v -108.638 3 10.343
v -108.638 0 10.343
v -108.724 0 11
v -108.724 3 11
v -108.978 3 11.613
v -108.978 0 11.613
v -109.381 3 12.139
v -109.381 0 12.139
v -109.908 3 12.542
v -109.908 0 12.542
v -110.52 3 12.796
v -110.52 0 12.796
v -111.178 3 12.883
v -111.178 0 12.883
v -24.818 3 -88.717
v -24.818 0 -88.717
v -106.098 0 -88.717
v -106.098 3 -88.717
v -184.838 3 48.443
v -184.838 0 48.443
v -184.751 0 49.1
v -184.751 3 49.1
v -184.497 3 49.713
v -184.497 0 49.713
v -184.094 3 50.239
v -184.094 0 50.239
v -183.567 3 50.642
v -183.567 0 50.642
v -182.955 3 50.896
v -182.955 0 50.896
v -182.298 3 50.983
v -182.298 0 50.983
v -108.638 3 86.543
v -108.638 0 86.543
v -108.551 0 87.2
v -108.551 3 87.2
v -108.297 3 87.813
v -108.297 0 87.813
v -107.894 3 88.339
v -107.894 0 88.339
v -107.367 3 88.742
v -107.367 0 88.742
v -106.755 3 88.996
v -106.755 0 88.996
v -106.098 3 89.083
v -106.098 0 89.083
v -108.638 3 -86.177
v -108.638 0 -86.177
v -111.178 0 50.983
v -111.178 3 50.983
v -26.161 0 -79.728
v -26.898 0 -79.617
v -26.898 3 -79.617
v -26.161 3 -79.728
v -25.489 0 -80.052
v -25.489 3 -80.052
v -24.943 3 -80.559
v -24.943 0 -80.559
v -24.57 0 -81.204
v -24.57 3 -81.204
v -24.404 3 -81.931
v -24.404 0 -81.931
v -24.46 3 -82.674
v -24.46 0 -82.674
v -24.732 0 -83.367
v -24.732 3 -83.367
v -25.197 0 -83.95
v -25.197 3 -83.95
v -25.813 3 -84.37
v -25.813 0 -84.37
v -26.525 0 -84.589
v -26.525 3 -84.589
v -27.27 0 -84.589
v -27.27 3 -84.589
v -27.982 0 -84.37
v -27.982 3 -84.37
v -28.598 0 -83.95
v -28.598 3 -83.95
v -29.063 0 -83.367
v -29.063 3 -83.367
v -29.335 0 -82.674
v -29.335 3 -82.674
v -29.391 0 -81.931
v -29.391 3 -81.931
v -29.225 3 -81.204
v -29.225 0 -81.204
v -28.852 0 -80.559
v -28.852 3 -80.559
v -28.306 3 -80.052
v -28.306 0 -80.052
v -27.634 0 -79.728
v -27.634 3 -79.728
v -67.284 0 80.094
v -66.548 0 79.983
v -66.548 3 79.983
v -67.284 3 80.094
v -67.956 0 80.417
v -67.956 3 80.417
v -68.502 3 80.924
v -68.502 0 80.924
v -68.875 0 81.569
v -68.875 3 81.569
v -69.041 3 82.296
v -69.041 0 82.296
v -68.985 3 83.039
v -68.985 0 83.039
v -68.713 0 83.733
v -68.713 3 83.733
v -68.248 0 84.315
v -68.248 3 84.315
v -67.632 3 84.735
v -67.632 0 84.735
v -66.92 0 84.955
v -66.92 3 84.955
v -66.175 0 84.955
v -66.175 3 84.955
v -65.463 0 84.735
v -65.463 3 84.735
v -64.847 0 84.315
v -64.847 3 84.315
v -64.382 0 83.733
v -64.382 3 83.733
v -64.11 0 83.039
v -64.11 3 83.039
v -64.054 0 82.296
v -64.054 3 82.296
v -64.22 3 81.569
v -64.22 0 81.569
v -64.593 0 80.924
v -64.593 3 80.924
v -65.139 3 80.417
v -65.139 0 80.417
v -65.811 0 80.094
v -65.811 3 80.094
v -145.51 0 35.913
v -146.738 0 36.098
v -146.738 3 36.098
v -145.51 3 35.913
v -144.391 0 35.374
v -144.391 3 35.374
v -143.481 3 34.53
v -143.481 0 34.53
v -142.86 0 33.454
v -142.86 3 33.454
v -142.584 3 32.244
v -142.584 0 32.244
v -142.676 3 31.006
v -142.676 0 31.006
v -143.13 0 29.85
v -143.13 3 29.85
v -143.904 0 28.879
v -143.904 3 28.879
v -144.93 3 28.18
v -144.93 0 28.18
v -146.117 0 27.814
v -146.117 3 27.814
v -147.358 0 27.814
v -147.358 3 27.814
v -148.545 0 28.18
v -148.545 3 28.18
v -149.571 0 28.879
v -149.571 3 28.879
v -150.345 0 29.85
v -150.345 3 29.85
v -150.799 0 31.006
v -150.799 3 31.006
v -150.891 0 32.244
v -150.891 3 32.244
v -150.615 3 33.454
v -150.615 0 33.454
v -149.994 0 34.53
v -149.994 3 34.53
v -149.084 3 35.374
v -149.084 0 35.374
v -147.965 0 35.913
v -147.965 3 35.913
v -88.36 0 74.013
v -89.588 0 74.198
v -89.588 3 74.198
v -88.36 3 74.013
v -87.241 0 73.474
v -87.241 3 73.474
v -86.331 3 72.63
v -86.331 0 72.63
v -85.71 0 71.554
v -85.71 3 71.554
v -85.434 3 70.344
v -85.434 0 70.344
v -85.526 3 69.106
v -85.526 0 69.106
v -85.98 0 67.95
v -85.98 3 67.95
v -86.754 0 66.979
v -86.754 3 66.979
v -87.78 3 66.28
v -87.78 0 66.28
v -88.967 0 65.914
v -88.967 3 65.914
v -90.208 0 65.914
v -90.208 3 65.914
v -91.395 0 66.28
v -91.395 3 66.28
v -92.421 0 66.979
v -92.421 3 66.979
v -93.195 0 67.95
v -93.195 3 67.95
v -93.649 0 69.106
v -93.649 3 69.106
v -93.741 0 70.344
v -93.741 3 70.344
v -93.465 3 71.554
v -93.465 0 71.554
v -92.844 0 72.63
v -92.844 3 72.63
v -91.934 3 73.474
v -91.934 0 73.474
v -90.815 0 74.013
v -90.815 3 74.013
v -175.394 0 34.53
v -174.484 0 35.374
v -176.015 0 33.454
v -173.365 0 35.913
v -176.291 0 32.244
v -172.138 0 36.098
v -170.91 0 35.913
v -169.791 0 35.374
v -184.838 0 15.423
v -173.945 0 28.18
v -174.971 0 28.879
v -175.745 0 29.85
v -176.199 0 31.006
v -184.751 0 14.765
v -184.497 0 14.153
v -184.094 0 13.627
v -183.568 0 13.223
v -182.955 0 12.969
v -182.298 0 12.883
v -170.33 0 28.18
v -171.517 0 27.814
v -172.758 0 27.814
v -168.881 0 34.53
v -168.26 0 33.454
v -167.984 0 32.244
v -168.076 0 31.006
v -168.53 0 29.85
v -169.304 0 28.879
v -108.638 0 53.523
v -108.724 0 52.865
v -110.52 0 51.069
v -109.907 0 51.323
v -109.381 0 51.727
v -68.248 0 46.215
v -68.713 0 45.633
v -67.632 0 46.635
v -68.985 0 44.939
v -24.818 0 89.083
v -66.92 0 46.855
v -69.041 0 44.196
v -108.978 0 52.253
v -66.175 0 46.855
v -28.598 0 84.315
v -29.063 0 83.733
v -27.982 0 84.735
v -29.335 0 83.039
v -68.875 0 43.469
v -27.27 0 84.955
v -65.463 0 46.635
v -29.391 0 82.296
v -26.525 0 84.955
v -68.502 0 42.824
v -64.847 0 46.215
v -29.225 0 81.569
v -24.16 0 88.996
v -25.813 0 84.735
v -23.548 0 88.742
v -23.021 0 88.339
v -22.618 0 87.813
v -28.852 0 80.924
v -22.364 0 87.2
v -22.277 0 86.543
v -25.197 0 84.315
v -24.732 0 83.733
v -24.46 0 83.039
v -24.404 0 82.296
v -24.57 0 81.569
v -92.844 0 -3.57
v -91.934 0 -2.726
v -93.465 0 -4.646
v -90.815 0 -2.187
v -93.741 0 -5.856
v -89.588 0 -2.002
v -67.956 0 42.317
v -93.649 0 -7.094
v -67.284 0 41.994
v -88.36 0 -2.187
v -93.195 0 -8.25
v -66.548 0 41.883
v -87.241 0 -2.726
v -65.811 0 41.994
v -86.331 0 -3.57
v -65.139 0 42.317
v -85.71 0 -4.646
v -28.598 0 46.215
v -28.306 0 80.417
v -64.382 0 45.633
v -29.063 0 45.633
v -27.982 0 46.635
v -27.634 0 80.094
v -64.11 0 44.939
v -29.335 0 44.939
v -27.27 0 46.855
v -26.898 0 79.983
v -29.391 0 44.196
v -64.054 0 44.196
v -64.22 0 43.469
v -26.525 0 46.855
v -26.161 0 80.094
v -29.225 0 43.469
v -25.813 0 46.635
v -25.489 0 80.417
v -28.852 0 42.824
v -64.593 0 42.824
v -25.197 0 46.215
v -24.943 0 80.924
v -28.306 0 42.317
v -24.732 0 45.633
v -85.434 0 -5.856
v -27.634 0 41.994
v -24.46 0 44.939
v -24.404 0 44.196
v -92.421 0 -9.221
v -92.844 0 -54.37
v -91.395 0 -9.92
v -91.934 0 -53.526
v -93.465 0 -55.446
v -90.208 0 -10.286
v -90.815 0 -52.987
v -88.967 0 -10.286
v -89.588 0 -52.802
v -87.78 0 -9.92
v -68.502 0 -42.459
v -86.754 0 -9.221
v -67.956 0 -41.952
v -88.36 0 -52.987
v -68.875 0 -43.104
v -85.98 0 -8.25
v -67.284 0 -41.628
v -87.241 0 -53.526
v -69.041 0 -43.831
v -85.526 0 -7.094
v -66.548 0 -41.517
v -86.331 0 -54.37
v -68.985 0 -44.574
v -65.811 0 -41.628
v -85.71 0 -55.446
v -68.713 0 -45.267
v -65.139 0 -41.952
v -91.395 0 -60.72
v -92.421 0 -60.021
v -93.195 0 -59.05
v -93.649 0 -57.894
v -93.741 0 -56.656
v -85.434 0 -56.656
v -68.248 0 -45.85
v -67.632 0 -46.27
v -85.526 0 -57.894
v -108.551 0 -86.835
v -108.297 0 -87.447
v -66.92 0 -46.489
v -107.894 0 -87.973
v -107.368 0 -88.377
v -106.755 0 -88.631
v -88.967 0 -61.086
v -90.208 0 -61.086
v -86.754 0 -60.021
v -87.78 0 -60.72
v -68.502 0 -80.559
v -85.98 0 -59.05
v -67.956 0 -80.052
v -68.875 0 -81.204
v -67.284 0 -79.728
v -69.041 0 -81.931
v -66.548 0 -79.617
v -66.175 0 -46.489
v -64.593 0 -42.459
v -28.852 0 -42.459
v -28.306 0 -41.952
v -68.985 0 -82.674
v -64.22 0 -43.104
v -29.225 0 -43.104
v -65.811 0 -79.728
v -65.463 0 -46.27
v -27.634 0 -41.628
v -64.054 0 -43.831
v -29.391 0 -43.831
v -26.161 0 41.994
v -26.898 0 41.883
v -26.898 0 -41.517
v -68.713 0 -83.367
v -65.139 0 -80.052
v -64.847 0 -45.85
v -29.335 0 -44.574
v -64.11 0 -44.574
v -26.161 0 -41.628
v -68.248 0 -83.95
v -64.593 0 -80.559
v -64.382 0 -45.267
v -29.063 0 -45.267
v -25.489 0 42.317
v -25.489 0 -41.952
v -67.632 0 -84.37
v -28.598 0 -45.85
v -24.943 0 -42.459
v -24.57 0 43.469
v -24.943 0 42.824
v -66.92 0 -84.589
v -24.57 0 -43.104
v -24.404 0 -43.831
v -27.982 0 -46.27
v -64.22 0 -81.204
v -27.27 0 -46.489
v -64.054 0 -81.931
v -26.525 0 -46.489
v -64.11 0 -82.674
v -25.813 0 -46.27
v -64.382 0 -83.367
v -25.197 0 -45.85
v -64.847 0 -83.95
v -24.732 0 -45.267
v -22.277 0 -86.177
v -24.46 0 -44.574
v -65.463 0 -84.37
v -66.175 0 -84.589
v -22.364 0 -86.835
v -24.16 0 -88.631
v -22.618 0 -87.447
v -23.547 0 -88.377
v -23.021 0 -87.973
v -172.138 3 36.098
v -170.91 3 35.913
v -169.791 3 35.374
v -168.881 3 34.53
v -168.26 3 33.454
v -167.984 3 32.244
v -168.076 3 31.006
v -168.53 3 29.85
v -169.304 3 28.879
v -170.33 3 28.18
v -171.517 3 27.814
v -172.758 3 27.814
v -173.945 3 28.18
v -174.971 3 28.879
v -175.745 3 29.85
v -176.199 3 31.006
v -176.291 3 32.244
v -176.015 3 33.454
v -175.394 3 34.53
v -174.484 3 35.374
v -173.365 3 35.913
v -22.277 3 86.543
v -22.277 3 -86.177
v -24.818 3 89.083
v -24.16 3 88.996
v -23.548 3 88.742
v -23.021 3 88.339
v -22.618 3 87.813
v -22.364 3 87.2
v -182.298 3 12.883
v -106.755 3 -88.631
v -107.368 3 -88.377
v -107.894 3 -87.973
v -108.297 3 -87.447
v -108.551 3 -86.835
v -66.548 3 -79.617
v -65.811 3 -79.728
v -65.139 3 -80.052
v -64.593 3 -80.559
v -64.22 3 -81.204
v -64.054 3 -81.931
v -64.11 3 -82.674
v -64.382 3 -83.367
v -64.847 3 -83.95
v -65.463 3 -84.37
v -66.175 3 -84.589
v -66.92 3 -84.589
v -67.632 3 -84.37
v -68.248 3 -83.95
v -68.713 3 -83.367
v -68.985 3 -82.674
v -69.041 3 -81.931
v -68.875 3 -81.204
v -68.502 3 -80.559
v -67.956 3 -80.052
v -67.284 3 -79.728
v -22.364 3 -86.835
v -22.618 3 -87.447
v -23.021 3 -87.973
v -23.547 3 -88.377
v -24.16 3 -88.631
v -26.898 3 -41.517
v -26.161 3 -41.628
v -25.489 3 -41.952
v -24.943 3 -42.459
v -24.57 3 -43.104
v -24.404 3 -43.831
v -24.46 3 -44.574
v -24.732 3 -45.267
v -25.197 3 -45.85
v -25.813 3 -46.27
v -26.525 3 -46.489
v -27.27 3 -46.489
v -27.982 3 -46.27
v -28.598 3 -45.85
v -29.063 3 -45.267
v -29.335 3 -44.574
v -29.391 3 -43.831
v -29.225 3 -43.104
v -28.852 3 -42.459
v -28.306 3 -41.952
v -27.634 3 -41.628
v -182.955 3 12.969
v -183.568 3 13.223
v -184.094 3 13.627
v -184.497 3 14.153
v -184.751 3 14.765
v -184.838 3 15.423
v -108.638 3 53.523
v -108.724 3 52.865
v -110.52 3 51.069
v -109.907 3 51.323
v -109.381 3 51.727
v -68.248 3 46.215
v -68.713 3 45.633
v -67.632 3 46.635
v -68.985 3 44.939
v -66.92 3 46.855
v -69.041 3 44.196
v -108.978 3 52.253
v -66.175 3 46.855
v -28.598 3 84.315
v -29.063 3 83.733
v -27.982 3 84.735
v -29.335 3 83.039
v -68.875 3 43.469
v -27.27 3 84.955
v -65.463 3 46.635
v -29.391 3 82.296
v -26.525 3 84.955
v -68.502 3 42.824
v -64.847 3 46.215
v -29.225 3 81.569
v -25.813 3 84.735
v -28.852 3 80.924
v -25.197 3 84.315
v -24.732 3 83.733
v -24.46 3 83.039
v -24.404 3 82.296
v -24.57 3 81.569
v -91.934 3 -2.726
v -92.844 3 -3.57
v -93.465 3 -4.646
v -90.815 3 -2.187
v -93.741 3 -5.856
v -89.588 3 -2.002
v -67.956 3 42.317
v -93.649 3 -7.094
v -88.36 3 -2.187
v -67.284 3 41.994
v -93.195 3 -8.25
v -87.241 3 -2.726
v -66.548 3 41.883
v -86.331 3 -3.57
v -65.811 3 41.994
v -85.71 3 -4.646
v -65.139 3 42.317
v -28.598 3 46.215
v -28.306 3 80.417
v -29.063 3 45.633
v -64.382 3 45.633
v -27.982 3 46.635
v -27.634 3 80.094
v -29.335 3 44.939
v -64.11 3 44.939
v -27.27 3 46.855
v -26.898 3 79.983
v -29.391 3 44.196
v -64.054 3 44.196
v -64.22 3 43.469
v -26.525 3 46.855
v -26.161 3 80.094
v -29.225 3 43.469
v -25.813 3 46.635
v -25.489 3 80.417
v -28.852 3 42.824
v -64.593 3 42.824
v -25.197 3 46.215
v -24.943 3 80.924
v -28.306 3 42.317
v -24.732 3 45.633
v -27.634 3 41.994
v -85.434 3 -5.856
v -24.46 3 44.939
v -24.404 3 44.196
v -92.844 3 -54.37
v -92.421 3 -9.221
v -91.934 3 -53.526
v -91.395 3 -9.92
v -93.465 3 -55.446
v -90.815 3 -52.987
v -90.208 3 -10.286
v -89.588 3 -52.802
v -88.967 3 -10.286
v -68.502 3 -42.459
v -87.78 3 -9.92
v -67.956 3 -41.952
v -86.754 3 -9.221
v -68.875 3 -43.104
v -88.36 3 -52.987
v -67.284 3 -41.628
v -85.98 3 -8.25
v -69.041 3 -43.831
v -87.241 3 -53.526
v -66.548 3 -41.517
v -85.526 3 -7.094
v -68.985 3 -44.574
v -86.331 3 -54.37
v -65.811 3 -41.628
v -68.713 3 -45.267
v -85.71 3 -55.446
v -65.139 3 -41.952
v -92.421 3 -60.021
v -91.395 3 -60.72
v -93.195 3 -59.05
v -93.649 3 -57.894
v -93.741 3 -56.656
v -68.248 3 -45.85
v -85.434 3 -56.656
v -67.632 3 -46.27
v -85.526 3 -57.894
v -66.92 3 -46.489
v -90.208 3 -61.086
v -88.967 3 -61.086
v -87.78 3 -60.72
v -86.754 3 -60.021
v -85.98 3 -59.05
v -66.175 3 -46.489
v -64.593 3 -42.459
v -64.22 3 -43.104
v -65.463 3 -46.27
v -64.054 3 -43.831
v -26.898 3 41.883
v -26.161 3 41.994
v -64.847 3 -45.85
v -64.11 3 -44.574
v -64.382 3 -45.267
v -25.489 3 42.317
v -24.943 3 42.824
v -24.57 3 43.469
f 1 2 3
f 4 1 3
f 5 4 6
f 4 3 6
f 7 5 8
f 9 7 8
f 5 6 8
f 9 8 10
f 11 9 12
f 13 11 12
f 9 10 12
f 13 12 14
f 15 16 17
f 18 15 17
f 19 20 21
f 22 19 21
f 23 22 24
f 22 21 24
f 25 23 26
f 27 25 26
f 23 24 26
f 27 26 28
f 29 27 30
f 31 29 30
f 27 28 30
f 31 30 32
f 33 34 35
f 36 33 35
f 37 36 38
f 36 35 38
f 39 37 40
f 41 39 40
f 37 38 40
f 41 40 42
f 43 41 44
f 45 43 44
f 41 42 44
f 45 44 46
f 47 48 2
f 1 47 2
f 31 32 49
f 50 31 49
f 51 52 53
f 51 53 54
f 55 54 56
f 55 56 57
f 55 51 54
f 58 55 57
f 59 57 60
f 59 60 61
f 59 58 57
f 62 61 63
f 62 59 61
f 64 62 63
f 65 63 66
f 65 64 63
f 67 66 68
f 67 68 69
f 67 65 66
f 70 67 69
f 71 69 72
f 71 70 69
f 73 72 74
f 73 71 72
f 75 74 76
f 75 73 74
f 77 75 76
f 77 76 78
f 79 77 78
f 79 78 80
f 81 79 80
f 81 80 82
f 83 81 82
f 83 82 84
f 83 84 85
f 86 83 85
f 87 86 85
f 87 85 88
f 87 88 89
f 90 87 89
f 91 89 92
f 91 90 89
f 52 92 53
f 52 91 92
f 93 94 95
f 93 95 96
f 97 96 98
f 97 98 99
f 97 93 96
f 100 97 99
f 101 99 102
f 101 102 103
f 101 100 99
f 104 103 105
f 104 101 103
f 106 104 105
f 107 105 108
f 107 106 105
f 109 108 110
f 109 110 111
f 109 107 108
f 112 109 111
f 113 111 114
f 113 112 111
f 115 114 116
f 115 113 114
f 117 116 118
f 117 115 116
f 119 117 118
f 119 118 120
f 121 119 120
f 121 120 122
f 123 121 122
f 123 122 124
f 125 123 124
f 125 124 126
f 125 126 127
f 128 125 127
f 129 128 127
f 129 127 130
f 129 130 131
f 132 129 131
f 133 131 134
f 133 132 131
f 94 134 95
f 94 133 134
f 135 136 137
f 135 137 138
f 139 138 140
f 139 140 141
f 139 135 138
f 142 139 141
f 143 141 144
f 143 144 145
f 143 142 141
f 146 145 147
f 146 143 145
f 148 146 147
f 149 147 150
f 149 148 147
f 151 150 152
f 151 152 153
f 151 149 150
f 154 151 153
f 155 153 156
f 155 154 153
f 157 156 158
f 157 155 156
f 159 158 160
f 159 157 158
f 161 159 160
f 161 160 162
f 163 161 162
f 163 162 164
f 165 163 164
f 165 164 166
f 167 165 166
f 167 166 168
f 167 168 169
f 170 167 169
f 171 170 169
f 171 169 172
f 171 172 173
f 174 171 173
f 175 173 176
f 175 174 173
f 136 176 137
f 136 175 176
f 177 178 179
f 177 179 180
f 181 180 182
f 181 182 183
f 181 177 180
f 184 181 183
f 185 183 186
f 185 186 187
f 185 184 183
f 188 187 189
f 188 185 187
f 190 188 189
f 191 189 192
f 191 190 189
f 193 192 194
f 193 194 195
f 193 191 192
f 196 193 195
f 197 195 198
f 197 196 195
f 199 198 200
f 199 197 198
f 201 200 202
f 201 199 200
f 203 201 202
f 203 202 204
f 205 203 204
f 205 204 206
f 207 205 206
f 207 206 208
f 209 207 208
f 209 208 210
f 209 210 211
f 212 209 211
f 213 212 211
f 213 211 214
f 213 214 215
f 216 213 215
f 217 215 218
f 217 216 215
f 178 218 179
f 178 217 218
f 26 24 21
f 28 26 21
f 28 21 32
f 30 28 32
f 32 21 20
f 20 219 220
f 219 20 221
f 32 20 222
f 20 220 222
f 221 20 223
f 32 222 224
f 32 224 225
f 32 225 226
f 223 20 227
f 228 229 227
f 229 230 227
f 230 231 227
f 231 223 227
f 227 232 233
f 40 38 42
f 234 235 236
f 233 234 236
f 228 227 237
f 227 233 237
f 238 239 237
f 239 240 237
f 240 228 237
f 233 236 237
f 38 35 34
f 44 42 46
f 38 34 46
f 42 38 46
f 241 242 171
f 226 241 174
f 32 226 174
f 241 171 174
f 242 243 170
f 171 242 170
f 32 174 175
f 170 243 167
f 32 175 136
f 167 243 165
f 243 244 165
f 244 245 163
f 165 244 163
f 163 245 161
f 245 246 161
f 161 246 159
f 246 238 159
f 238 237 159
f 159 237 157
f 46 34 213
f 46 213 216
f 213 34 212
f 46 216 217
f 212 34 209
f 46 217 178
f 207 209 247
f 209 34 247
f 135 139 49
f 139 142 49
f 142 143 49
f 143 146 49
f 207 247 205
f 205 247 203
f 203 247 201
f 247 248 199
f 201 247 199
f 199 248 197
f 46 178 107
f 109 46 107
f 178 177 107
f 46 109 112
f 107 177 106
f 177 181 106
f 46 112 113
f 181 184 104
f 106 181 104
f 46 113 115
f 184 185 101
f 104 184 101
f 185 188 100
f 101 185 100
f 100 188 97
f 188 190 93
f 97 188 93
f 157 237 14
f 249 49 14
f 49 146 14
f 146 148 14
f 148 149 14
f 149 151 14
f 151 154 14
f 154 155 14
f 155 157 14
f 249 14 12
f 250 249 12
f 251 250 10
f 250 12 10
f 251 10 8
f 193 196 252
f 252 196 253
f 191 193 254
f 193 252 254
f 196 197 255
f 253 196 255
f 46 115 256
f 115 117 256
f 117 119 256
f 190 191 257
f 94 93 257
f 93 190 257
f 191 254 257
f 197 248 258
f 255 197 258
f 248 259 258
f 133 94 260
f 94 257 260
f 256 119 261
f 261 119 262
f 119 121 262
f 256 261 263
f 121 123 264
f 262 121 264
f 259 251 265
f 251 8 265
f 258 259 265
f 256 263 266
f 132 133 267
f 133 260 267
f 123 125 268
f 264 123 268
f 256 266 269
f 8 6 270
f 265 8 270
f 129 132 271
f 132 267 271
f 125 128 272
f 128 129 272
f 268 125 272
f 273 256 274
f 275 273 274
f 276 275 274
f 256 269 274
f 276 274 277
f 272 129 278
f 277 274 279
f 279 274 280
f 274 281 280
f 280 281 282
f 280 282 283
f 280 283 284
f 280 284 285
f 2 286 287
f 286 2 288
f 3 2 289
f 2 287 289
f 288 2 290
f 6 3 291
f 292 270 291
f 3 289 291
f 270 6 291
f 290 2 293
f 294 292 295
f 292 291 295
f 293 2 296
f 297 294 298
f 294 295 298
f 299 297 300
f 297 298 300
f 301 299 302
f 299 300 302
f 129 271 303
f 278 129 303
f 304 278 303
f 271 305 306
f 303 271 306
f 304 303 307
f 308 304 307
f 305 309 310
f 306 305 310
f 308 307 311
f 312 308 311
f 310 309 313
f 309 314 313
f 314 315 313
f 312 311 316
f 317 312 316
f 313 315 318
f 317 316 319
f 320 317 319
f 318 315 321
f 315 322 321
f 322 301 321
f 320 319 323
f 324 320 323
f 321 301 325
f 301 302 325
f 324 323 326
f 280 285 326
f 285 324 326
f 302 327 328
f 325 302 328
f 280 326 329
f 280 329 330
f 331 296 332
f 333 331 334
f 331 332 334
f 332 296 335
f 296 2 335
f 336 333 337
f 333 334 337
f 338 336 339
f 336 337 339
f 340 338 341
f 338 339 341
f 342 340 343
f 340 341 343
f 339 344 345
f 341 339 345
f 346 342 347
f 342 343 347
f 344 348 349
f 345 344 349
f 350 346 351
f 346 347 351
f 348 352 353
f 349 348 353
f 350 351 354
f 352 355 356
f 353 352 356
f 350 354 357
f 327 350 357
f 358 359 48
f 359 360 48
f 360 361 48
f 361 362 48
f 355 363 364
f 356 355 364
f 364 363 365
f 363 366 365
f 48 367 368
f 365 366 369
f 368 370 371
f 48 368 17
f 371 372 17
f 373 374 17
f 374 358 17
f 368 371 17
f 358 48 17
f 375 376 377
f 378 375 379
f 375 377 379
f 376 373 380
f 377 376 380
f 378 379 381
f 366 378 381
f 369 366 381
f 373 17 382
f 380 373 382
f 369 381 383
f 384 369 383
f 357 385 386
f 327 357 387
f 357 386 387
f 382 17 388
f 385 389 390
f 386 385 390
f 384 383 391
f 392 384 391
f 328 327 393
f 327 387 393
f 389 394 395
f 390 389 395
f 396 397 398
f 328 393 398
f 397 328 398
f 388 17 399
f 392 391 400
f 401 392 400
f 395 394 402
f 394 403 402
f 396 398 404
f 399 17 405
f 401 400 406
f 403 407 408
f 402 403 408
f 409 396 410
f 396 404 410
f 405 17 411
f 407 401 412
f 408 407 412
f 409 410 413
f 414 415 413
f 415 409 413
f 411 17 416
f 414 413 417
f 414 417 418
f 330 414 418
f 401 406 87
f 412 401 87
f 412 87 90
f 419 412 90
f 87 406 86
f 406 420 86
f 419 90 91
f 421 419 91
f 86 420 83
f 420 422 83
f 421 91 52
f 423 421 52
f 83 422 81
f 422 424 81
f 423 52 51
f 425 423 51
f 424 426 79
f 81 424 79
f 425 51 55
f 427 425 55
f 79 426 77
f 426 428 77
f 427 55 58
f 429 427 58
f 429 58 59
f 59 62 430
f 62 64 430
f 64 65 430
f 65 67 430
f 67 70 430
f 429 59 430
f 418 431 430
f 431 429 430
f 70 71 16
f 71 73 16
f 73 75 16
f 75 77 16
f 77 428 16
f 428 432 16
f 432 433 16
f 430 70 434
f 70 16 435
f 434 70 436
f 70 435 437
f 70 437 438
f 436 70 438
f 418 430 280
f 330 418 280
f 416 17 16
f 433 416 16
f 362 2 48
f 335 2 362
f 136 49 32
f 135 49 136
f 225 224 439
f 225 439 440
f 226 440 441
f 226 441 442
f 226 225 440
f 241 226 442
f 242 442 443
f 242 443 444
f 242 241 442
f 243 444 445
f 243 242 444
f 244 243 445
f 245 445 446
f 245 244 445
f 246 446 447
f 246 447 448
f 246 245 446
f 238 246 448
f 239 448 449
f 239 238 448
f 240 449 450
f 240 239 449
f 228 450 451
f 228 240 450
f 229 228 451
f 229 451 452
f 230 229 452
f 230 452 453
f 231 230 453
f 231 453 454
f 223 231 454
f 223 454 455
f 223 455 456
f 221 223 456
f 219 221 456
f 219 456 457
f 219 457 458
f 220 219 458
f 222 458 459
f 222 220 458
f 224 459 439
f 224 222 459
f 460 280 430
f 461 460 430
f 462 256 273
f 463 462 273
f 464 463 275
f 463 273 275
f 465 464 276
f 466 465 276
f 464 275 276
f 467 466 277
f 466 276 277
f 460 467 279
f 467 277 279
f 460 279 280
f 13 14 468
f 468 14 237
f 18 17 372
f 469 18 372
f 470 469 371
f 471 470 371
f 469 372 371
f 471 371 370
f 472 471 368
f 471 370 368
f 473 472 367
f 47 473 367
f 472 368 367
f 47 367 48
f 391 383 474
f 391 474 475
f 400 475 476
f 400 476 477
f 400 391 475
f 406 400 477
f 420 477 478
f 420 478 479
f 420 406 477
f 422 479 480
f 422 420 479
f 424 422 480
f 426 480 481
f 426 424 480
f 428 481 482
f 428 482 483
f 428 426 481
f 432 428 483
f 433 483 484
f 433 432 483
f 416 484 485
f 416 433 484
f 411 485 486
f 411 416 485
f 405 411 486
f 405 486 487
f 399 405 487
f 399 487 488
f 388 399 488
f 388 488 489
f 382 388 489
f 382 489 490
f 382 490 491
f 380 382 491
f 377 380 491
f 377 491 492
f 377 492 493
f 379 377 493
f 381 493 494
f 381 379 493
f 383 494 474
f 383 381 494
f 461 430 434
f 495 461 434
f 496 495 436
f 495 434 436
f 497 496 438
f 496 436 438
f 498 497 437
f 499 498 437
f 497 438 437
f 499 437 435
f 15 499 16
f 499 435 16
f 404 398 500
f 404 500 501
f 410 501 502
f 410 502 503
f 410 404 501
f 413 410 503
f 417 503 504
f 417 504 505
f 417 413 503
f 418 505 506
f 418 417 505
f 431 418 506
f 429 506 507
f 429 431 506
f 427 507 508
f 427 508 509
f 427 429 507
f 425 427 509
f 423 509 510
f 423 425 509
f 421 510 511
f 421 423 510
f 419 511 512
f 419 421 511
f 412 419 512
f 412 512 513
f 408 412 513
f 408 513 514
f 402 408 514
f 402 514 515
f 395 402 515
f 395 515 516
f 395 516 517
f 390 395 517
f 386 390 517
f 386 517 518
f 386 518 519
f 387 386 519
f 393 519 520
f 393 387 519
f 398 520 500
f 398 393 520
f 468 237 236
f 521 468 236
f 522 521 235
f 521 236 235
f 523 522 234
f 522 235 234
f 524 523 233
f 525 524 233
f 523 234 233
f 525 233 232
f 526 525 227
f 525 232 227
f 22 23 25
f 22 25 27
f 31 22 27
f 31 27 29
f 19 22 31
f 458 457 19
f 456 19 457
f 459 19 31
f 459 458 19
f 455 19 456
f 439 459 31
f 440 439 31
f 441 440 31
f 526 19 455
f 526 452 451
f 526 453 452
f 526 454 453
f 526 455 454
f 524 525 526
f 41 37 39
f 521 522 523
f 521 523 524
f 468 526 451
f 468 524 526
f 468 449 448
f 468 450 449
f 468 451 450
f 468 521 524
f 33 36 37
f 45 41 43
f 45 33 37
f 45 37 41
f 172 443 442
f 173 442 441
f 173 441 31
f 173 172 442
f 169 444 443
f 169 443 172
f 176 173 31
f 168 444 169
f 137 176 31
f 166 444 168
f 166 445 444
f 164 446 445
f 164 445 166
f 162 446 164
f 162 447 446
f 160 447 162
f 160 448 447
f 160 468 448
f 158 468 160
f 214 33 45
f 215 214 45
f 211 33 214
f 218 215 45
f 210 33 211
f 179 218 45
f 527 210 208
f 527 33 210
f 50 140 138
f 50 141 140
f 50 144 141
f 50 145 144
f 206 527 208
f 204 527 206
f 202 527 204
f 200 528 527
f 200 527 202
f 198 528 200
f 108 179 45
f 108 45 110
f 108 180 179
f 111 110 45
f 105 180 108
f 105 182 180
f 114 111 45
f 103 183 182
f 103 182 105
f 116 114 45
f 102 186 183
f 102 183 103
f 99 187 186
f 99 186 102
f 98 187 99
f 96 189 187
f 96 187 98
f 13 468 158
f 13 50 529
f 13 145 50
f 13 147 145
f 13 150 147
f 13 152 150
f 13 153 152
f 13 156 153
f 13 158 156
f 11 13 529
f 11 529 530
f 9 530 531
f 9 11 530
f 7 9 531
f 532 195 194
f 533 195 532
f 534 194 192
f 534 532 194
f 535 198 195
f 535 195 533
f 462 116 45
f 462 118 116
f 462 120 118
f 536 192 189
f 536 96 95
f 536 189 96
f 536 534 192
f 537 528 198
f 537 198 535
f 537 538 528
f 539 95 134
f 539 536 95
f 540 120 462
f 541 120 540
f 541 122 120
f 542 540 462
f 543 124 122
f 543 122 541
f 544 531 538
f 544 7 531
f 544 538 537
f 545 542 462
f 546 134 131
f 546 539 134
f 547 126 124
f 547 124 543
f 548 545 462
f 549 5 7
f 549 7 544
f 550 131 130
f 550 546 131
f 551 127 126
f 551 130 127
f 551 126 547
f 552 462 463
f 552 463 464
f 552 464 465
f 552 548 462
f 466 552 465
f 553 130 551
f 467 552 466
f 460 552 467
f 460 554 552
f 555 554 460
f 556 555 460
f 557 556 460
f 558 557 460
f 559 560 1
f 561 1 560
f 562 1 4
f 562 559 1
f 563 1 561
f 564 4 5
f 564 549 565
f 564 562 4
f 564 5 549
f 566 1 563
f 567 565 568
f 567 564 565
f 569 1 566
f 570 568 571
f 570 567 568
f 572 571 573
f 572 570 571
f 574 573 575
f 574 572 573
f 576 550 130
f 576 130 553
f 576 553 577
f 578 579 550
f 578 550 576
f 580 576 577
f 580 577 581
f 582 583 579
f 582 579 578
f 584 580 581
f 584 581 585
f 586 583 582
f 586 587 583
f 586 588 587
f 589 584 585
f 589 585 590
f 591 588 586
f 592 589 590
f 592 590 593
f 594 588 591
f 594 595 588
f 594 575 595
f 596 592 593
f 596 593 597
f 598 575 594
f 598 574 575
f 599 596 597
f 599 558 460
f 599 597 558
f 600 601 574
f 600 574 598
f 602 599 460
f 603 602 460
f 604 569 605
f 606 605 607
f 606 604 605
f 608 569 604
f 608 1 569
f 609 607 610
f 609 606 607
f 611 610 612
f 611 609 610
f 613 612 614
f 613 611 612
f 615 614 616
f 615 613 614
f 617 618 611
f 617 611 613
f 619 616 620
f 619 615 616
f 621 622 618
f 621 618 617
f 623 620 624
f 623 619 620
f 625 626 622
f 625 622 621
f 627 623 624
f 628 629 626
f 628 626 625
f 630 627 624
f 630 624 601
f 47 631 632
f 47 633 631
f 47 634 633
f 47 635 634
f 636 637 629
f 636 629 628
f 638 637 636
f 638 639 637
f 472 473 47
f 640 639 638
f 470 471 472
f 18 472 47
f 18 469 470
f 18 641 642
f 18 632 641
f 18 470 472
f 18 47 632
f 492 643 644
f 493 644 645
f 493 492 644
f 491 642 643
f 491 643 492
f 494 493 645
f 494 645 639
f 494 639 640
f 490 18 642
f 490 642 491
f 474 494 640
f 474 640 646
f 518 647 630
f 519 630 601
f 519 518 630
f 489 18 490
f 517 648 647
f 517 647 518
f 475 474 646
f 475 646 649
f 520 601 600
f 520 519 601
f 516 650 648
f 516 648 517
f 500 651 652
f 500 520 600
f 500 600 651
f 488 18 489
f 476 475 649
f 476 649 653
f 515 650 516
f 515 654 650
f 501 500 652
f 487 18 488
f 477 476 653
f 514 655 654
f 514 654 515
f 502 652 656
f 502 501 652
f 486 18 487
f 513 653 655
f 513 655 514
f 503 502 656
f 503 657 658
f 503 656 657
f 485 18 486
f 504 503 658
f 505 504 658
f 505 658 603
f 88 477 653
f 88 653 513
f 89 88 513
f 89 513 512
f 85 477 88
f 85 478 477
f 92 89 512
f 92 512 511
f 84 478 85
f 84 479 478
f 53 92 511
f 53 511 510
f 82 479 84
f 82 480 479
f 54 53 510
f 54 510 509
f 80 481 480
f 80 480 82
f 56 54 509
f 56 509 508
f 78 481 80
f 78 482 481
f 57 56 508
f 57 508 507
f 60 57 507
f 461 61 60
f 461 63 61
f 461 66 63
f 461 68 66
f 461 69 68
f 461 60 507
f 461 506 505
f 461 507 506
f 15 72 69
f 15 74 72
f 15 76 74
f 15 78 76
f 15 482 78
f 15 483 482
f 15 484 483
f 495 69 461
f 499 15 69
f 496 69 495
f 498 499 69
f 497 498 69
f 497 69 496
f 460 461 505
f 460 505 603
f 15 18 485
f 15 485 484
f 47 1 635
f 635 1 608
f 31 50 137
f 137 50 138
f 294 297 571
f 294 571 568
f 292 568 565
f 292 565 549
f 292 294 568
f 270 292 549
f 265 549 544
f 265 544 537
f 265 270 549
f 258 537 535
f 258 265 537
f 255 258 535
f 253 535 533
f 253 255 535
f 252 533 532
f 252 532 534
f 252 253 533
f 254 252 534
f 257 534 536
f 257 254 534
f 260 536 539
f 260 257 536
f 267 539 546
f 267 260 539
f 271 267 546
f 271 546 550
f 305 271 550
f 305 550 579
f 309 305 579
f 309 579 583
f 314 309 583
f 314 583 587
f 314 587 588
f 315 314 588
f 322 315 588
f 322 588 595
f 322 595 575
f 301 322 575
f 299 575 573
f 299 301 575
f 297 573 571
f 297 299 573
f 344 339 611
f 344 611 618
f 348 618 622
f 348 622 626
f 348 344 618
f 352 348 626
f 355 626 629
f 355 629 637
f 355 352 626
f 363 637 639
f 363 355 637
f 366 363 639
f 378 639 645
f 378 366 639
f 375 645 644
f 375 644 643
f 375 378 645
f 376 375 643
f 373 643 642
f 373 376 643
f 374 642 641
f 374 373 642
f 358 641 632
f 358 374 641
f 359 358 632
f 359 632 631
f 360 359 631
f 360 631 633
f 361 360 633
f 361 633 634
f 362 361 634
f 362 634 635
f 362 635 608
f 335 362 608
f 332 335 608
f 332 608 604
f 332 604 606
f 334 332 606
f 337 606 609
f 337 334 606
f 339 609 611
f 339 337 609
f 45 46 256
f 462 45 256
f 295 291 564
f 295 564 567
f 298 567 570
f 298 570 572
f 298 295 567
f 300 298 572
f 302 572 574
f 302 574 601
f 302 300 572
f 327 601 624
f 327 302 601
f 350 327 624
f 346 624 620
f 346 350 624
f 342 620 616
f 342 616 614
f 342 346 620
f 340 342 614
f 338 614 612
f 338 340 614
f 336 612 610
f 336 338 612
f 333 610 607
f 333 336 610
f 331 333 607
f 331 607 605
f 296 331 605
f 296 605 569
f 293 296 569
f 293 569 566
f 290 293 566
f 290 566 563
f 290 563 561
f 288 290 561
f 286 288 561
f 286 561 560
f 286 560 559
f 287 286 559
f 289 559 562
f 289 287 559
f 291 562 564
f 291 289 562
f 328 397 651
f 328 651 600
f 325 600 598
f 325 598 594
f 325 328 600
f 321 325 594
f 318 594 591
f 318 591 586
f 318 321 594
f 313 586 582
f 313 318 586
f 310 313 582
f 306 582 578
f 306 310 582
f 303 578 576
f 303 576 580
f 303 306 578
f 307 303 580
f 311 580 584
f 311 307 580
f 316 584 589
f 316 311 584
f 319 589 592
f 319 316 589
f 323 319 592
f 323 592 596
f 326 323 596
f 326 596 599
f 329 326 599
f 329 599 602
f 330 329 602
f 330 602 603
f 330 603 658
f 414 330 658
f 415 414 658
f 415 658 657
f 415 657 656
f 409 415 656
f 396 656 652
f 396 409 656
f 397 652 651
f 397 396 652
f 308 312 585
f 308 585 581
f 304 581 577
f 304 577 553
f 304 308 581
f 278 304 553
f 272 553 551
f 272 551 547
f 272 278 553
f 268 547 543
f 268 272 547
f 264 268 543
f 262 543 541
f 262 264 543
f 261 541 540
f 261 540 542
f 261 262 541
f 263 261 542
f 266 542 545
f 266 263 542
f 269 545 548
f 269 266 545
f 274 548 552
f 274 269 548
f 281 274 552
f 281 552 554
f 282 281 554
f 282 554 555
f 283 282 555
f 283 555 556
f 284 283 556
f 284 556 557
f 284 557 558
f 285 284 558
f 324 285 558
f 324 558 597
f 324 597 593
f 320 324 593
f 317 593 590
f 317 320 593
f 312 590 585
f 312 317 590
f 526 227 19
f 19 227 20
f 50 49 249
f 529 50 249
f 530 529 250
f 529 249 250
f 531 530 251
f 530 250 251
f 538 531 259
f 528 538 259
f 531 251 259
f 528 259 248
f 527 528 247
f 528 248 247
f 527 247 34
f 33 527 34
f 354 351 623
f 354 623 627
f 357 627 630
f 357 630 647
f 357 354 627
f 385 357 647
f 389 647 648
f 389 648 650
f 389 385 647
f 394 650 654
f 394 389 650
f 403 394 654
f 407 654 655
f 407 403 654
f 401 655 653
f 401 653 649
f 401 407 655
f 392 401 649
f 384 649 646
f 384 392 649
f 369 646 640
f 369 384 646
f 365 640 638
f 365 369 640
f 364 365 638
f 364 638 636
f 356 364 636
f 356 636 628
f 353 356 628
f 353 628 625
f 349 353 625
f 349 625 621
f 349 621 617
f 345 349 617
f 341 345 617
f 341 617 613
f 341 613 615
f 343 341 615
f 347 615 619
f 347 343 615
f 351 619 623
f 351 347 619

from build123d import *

# Parameters (mm, degrees)
SKETCH1_R           = 2.5
SKETCH1_R_2         = 4.1656
BOSS_EXTRUDE1_DEPTH = 3


with BuildPart() as part:
    # Sketch1 → Boss-Extrude1 (new body)
    with BuildSketch(Plane(origin=(0, 0, 0), x_dir=(1, 0, 0), z_dir=(0, 1, 0))):
        with BuildLine():
            Line((-108.6375, -53.522608696), (-108.6375, -86.542608696))
            ThreePointArc((-108.6375, -86.542608696), (-107.893551224, -88.33865992), (-106.0975, -89.082608696))
            Line((-106.0975, -89.082608696), (-24.8175, -89.082608696))
            ThreePointArc((-24.8175, -89.082608696), (-23.021448776, -88.33865992), (-22.2775, -86.542608696))
            Line((-22.2775, -86.542608696), (-22.2775, 86.177391304))
            ThreePointArc((-22.2775, 86.177391304), (-23.021448776, 87.973442529), (-24.8175, 88.717391304))
            Line((-24.8175, 88.717391304), (-106.0975, 88.717391304))
            ThreePointArc((-106.0975, 88.717391304), (-107.893551224, 87.973442529), (-108.6375, 86.177391304))
            Line((-108.6375, 86.177391304), (-108.6375, -10.342608696))
            ThreePointArc((-108.6375, -10.342608696), (-109.381448776, -12.13865992), (-111.1775, -12.882608696))
            Line((-111.1775, -12.882608696), (-182.2975, -12.882608696))
            ThreePointArc((-182.2975, -12.882608696), (-184.093551224, -13.626557471), (-184.8375, -15.422608696))
            Line((-184.8375, -15.422608696), (-184.8375, -48.442608696))
            ThreePointArc((-184.8375, -48.442608696), (-184.093551224, -50.23865992), (-182.2975, -50.982608696))
            Line((-182.2975, -50.982608696), (-111.1775, -50.982608696))
            ThreePointArc((-111.1775, -50.982608696), (-109.381448776, -51.726557471), (-108.6375, -53.522608696))
        make_face()
        with Locations(Location((-66.5475, 82.117391304, 0), (0, 0, 270))):
            Circle(SKETCH1_R, mode=Mode.SUBTRACT)
        with Locations(Location((-26.8975, 82.117391304, 0), (0, 0, 270))):
            Circle(SKETCH1_R, mode=Mode.SUBTRACT)
        with Locations(Location((-66.5475, 44.017391304, 0), (0, 0, 270))):
            Circle(SKETCH1_R, mode=Mode.SUBTRACT)
        with Locations(Location((-26.8975, 44.017391304, 0), (0, 0, 270))):
            Circle(SKETCH1_R, mode=Mode.SUBTRACT)
        with Locations(Location((-26.8975, -44.382608696, 0), (0, 0, 90))):
            Circle(SKETCH1_R, mode=Mode.SUBTRACT)
        with Locations(Location((-66.5475, -44.382608696, 0), (0, 0, 90))):
            Circle(SKETCH1_R, mode=Mode.SUBTRACT)
        with Locations(Location((-26.8975, -82.482608696, 0), (0, 0, 90))):
            Circle(SKETCH1_R, mode=Mode.SUBTRACT)
        with Locations(Location((-66.5475, -82.482608696, 0), (0, 0, 90))):
            Circle(SKETCH1_R, mode=Mode.SUBTRACT)
        with Locations(Location((-89.5875, -70.032608696, 0), (0, 0, 270))):
            Circle(SKETCH1_R_2, mode=Mode.SUBTRACT)
        with Locations(Location((-89.5875, 6.167391304, 0), (0, 0, 270))):
            Circle(SKETCH1_R_2, mode=Mode.SUBTRACT)
        with Locations(Location((-89.5875, 56.967391304, 0), (0, 0, 270))):
            Circle(SKETCH1_R_2, mode=Mode.SUBTRACT)
        with Locations(Location((-172.1375, -31.932608696, 0), (0, 0, 270))):
            Circle(SKETCH1_R_2, mode=Mode.SUBTRACT)
        with Locations(Location((-146.7375, -31.932608696, 0), (0, 0, 270))):
            Circle(SKETCH1_R_2, mode=Mode.SUBTRACT)
    extrude(amount=BOSS_EXTRUDE1_DEPTH)


solid = part.part
